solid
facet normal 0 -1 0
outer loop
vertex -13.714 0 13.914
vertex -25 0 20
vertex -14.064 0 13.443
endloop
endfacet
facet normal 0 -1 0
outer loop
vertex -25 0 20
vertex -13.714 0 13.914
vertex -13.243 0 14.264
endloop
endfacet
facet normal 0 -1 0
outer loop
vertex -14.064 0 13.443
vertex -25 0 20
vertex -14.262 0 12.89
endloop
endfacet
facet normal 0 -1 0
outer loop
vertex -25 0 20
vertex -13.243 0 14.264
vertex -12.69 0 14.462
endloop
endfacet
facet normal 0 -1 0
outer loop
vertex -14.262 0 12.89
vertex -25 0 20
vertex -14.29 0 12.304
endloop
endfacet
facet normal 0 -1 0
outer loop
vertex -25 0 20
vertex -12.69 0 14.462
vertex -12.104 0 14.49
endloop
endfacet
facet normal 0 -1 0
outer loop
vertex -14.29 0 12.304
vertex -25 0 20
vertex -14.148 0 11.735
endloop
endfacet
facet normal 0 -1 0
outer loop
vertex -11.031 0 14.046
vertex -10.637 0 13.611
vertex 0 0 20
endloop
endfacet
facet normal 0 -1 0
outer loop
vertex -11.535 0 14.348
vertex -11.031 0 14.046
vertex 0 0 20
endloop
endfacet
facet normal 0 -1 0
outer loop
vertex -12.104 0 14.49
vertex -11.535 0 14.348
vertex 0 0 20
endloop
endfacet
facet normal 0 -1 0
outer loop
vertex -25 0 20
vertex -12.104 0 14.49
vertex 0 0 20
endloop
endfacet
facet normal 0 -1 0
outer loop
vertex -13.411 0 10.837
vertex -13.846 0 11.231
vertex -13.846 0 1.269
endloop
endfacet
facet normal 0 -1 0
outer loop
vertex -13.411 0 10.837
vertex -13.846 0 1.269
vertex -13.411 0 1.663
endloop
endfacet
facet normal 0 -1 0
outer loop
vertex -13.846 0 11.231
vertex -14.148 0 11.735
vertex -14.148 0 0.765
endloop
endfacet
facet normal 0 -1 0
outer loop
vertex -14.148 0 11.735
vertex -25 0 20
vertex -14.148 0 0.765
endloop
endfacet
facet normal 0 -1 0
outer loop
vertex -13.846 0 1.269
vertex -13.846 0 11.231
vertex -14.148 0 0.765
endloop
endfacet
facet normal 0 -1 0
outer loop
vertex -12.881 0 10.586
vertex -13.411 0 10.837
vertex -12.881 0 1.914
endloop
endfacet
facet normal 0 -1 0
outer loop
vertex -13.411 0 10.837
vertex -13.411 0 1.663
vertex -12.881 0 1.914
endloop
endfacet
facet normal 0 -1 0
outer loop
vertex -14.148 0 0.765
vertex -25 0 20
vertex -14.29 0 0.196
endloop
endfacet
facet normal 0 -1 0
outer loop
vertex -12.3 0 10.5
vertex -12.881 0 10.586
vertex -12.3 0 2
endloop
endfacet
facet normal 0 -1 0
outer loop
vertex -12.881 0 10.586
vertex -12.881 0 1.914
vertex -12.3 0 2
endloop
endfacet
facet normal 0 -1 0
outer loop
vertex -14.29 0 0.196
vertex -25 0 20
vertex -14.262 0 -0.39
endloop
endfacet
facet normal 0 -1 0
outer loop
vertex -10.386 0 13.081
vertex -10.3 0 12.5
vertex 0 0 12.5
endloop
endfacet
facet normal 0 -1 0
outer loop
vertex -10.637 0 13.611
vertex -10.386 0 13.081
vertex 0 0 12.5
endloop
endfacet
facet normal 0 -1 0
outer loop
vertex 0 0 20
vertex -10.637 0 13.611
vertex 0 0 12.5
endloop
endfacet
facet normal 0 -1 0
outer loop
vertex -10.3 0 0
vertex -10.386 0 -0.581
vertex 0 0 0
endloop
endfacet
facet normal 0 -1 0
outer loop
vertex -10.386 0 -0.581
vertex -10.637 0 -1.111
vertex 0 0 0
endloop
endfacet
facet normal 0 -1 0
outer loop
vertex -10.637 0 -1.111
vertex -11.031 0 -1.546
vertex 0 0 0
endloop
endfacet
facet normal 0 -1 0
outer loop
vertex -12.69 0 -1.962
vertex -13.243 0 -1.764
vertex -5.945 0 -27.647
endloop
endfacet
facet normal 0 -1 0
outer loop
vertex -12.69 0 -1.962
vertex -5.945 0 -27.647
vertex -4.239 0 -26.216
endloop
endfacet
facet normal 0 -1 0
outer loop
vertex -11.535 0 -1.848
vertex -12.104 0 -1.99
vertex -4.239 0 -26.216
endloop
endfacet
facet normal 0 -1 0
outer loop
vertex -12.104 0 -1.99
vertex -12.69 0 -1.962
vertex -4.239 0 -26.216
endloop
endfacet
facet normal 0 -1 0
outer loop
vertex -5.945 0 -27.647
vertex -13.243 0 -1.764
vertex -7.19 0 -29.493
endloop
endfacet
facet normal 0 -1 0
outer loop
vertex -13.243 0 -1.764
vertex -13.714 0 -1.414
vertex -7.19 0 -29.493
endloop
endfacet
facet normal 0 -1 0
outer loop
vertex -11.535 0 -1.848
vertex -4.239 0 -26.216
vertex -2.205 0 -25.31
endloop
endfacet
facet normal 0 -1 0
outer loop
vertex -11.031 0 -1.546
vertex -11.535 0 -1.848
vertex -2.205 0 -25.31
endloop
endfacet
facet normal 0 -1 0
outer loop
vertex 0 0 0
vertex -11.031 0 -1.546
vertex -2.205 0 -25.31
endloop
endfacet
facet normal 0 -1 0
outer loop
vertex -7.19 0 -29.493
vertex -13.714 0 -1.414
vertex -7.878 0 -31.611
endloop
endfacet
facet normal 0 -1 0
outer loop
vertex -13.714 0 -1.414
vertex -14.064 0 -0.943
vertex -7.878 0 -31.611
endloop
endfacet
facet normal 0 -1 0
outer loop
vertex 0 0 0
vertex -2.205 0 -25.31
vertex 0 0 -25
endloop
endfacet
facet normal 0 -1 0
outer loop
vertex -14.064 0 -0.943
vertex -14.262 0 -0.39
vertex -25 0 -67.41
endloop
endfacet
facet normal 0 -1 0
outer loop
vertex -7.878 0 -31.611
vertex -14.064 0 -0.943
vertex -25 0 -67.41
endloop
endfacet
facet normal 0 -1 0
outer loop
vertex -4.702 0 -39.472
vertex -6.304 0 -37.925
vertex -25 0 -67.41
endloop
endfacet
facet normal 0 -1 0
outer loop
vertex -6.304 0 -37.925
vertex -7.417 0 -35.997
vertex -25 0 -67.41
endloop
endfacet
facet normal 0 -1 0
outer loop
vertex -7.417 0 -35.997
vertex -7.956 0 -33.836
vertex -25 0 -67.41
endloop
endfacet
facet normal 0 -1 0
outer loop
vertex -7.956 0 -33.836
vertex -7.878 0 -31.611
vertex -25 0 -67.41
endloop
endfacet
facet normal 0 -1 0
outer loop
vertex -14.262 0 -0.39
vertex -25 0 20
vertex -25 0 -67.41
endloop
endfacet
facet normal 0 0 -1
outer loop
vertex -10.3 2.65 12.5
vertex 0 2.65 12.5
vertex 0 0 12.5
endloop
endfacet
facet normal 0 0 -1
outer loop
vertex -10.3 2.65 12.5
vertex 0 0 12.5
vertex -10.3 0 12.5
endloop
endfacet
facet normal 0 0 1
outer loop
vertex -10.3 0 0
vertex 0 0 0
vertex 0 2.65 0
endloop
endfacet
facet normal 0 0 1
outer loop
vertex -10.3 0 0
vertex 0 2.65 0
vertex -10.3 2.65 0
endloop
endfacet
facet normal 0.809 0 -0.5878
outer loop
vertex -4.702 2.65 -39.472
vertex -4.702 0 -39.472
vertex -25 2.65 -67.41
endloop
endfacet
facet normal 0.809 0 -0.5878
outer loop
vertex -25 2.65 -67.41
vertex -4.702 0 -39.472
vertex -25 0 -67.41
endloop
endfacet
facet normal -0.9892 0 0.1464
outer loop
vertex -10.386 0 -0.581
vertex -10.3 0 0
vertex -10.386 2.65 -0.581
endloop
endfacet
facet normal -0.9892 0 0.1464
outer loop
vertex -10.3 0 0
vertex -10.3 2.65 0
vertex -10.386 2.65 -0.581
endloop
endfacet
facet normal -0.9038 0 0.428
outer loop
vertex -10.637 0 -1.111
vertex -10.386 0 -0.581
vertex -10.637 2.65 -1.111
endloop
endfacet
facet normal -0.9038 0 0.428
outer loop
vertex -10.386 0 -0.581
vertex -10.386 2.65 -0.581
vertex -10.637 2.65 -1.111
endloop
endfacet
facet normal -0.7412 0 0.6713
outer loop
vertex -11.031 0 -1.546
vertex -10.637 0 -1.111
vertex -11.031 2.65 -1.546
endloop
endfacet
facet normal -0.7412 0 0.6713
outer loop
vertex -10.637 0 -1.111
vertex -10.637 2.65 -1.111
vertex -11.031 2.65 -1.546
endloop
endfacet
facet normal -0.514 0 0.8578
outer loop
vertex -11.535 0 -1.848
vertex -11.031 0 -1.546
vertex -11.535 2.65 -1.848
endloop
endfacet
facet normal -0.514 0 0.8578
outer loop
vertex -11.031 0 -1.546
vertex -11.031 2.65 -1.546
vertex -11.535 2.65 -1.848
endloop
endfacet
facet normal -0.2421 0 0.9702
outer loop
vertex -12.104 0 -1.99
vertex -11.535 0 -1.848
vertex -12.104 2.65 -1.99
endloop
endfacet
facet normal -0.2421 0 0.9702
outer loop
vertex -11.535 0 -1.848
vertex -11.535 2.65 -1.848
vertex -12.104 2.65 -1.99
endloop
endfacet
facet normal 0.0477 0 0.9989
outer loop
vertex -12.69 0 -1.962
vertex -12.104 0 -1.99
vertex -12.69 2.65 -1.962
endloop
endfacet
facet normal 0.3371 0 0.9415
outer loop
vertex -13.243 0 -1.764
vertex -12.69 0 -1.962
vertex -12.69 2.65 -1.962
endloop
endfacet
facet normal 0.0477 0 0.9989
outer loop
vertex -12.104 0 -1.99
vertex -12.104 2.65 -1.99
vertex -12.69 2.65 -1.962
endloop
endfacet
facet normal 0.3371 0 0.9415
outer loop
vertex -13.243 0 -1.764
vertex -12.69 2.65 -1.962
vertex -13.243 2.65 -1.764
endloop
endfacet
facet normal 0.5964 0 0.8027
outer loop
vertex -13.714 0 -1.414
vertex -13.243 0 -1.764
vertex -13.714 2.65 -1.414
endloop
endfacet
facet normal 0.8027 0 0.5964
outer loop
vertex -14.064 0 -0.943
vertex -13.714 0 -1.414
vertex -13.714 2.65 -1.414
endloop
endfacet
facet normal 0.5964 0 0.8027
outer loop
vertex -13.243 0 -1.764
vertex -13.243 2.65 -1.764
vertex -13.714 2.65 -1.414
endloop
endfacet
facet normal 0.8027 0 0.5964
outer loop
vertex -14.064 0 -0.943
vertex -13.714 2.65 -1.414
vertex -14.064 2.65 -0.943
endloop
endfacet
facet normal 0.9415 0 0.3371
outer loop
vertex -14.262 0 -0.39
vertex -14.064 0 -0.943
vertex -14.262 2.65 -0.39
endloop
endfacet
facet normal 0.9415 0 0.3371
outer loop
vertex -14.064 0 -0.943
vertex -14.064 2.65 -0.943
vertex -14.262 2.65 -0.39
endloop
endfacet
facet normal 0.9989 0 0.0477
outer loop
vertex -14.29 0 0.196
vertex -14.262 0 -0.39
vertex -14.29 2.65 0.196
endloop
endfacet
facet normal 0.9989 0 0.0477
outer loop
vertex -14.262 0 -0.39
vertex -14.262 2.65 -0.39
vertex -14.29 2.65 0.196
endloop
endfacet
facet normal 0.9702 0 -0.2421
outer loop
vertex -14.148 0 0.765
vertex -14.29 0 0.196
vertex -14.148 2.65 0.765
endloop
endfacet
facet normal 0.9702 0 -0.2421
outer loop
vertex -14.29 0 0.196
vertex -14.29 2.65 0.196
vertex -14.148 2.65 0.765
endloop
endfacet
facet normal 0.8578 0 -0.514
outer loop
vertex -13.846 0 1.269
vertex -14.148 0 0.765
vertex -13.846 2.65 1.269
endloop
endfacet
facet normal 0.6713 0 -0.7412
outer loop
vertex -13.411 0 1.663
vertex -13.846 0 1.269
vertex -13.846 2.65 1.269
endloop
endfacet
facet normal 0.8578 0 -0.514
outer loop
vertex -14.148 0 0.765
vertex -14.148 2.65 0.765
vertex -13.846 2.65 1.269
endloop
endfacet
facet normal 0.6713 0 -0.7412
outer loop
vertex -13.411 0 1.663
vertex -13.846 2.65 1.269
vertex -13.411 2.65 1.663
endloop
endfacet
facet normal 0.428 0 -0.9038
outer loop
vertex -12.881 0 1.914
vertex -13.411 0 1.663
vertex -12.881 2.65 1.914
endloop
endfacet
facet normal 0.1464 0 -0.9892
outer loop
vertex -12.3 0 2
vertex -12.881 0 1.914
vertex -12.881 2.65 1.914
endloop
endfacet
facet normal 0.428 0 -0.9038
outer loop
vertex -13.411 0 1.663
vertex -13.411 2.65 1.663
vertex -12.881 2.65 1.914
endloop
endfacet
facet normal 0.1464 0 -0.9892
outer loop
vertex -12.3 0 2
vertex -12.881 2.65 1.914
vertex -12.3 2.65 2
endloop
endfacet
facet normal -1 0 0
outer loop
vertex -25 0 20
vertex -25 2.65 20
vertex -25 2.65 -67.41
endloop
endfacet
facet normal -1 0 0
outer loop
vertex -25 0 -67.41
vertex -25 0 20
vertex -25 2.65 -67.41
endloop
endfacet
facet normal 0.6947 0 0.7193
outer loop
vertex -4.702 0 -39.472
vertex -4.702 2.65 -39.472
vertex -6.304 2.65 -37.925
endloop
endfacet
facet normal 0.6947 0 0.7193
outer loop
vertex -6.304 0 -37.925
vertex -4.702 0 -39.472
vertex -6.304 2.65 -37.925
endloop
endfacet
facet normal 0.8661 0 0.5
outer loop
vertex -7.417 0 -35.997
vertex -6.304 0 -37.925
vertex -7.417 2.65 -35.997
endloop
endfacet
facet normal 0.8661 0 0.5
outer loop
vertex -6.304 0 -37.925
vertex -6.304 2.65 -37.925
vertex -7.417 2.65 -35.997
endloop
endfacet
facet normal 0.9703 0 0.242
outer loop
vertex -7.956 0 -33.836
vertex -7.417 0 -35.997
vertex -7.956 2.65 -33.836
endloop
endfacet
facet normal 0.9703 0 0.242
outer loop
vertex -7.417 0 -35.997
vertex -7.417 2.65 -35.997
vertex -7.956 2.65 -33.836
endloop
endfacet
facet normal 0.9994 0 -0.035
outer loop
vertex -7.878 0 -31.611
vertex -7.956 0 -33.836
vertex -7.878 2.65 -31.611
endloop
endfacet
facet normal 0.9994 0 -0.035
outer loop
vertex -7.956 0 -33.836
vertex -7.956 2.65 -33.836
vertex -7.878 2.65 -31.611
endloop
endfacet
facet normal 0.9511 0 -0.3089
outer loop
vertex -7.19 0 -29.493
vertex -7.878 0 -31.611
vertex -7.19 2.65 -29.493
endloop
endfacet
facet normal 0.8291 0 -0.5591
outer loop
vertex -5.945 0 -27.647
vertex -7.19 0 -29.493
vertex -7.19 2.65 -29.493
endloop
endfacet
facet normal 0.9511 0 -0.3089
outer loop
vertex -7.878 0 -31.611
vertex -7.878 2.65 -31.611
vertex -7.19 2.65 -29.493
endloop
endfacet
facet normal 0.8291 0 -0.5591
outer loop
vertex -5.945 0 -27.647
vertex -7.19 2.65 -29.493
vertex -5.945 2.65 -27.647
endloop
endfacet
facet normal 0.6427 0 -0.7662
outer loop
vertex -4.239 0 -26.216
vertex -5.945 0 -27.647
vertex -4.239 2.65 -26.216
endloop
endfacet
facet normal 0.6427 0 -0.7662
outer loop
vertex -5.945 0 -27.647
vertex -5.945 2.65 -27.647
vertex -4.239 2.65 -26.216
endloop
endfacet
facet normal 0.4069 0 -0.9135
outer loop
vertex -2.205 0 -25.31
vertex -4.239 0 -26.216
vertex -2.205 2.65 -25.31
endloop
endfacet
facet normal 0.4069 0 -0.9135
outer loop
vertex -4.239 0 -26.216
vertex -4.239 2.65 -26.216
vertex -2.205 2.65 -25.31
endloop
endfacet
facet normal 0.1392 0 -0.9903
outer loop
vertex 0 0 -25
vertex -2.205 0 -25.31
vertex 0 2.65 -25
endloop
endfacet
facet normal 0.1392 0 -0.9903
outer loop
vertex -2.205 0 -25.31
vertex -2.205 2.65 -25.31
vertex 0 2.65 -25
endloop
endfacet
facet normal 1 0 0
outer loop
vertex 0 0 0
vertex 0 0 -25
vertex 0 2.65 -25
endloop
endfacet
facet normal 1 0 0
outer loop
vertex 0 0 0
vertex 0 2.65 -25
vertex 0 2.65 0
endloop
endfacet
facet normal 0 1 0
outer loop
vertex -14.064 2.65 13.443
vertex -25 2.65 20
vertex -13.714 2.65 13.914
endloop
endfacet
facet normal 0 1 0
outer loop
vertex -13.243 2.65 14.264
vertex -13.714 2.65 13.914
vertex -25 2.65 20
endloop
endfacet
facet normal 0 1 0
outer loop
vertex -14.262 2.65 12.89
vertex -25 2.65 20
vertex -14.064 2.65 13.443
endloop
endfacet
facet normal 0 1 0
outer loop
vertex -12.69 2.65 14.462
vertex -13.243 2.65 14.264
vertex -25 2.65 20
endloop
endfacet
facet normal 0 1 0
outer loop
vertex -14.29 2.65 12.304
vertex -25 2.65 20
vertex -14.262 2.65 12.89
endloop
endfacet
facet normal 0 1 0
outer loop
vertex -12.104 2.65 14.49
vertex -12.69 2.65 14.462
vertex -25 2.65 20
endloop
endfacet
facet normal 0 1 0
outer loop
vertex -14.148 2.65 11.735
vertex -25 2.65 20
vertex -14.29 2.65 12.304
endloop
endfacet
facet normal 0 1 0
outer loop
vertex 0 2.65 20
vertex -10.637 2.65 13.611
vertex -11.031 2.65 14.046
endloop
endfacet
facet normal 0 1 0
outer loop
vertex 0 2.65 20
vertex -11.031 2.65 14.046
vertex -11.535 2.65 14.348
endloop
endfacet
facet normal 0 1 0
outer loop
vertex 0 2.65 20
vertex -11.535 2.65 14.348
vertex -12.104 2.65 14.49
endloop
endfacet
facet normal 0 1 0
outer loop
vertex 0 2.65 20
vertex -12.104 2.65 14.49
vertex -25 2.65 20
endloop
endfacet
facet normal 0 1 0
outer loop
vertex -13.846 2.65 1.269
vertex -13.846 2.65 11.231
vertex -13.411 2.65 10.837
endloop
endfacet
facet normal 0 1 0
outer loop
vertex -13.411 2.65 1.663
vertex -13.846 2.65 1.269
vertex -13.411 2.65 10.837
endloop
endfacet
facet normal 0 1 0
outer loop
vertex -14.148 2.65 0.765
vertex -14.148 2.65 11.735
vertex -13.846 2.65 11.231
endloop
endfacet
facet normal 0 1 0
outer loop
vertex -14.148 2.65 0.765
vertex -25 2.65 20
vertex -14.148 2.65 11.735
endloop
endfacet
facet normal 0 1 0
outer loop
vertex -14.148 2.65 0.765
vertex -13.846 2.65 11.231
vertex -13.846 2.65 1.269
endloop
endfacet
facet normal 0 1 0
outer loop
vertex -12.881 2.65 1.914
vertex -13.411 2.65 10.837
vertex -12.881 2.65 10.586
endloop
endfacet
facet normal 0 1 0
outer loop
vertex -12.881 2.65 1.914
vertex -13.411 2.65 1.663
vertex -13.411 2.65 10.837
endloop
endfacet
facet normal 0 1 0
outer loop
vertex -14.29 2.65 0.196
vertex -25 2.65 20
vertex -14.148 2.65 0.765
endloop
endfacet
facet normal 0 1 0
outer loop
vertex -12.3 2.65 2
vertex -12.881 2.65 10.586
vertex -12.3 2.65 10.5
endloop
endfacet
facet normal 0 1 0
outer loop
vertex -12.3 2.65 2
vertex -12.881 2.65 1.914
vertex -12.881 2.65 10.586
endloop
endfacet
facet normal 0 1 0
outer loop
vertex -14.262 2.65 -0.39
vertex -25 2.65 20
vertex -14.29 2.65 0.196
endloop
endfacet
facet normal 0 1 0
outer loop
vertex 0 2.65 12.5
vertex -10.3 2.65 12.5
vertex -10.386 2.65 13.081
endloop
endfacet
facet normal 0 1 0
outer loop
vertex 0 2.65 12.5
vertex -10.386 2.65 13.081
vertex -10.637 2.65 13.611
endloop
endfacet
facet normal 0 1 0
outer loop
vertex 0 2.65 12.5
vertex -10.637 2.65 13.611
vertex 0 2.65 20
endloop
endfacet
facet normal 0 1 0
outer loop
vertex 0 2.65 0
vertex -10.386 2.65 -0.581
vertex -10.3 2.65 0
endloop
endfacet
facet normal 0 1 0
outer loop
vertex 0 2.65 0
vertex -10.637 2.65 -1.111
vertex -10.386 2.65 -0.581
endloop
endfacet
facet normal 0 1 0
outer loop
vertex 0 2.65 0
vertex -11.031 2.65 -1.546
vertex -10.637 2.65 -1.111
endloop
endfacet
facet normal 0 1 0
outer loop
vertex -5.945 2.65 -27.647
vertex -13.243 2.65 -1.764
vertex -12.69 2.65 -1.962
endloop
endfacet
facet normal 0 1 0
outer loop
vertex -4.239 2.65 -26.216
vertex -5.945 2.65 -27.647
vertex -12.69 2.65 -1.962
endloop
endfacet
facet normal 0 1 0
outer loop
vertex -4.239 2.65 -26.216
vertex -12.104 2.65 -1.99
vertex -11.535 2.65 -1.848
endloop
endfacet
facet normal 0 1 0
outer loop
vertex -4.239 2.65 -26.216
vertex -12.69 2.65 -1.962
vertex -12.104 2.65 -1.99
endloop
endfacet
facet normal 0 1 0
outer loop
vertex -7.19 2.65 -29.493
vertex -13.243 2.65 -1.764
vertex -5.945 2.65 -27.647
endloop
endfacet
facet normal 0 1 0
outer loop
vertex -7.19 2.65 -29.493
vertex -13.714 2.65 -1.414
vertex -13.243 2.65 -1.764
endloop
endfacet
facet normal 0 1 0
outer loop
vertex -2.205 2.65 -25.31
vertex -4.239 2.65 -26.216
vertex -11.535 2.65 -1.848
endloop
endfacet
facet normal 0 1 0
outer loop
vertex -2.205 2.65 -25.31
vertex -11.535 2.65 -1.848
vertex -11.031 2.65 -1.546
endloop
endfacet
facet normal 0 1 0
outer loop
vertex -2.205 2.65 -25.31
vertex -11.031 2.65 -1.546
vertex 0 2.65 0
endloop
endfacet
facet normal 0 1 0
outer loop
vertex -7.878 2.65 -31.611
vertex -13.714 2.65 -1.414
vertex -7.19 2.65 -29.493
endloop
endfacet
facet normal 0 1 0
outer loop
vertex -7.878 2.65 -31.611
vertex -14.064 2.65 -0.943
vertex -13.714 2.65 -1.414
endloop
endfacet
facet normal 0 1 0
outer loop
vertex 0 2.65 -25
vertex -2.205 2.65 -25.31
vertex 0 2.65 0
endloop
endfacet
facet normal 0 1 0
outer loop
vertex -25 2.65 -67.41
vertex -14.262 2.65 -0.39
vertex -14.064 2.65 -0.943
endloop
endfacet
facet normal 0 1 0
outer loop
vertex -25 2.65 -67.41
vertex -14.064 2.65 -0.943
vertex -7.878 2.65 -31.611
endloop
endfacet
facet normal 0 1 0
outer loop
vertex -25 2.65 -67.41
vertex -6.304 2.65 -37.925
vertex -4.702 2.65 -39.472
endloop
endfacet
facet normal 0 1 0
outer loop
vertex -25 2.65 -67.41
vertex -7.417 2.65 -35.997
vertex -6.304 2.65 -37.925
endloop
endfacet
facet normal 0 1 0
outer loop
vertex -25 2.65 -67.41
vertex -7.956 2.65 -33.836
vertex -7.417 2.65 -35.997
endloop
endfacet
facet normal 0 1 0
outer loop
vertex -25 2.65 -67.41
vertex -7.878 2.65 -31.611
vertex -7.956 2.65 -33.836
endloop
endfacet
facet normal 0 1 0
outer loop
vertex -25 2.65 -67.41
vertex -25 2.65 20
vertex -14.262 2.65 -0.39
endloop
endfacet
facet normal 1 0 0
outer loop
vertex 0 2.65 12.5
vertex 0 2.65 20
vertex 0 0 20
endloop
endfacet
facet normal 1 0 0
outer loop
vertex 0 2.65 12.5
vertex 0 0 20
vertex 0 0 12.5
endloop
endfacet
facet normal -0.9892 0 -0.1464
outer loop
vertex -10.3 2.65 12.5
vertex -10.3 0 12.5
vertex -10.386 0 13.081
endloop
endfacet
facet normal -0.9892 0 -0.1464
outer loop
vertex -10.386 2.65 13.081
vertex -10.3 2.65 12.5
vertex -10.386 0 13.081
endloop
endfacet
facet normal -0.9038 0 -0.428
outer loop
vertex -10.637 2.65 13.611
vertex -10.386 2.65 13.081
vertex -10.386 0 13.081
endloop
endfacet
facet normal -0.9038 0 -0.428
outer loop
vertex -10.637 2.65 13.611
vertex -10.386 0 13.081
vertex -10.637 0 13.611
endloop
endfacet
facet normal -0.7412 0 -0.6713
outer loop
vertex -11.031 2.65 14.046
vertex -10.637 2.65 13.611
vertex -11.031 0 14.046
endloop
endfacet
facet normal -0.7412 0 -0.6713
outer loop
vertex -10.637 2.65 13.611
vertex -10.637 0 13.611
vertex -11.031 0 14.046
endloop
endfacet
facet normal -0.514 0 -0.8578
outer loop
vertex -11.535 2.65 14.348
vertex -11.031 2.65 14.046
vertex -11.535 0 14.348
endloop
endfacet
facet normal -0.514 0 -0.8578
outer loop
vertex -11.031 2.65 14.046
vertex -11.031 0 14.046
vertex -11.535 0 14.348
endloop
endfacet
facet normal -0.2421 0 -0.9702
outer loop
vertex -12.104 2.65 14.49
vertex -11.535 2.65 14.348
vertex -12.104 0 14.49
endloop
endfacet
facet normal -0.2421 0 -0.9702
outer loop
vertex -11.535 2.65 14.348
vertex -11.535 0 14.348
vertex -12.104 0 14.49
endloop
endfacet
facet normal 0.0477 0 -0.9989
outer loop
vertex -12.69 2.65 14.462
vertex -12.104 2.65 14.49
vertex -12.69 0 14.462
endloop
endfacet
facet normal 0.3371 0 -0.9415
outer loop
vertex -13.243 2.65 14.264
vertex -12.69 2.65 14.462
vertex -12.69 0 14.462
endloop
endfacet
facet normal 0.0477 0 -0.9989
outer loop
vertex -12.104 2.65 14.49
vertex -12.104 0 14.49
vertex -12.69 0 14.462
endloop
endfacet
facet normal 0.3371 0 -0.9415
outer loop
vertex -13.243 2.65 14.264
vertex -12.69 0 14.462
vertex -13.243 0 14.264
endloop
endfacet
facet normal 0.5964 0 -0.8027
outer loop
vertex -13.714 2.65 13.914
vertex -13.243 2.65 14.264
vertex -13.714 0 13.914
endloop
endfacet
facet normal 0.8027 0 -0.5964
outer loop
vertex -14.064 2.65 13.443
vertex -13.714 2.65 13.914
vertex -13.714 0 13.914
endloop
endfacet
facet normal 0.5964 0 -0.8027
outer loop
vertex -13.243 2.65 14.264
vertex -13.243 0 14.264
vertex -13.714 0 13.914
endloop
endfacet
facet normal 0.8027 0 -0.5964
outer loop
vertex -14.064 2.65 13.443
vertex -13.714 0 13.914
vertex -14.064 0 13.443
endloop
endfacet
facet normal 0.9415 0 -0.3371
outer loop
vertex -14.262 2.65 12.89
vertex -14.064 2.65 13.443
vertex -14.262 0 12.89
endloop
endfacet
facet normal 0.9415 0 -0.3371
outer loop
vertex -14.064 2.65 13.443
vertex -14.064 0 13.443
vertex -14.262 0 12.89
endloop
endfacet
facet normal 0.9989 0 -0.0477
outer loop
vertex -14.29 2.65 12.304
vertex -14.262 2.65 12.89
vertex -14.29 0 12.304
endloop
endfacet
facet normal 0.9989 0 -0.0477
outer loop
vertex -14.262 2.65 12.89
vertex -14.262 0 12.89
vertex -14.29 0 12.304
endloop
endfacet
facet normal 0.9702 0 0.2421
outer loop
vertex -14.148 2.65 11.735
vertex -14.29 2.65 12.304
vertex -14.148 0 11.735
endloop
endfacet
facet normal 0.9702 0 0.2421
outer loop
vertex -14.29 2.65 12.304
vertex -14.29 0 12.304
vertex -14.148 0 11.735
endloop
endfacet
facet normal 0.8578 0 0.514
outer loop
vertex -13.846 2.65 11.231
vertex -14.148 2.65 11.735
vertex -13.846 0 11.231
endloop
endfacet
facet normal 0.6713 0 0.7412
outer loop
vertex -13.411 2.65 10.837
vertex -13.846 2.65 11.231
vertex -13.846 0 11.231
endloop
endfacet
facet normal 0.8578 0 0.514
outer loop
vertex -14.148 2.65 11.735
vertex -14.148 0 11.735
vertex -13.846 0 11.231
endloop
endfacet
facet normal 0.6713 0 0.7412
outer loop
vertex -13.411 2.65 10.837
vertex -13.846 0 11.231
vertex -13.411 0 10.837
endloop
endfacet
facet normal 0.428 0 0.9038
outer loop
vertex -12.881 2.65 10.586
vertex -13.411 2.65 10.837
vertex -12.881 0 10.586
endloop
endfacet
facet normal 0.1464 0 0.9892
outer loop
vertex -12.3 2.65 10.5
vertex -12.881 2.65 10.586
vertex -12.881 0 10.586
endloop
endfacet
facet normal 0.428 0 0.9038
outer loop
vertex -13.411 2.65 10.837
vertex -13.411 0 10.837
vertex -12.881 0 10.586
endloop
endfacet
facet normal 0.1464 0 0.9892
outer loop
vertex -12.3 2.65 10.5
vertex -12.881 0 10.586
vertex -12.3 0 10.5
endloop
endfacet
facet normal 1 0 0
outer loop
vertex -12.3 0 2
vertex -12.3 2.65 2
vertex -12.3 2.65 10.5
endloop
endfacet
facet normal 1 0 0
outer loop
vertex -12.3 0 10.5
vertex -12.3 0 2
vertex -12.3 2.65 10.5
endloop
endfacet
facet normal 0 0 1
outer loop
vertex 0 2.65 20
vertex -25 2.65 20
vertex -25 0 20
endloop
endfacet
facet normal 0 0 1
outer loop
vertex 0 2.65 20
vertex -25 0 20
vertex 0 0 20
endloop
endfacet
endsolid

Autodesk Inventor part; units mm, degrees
ref_plane "YZ Plane" through (0, 0, 0) normal (1, 0, 0) x (0, 1, 0)
ref_plane "XZ Plane" through (0, 0, 0) normal (0, 1, 0) x (-1, 0, 0)
ref_plane "XY Plane" through (0, 0, 0) normal (0, 0, 1) x (1, 0, 0)
sketch "スケッチ1" plane through (0, 0, 0) normal (0, 1, 0) x (-1, 0, 0)
  line L0 (0, 0) -> (25, 0)
  line L1 (25, 0) -> (25, -33)
  line L2 (25, -33) -> (0, -33)
  line L3 (0, -33) -> (0, 0)
  line L4 (0, -33) -> (25, -27)
  line L5 (0, -33) -> (25, -67.4095)
  line L6 (25, -67.4095) -> (25, -33)
  dimension "d0" = 25
  dimension "d1" = 33
  dimension "d2" = 27
  dimension "d3" = 36
extrude "押し出し1" add sketch "スケッチ1" along normal blind 2.65
sketch "スケッチ2" plane through (0, 2.65, 0) normal (0, 1, 0) x (1, 0, 0)
  line L0 (0, 33) -> (-25, 67.4095) projected
  line L1 (0, 0) -> (0, 33) projected
  arc A0 (-4.7023, 39.4721) -> (0, 25) centre (0, 33) ccw
  dimension "d6" = 8
extrude "押し出し2" cut sketch "スケッチ2" against normal blind 2.65
sketch "スケッチ3" plane through (0, 2.65, 0) normal (0, 1, 0) x (1, 0, 0)
  line L0 (-25, 67.4095) -> (-25, 0) projected
  line L1 (-25, 0) -> (-12.3, 0)
  line L2 (-12.3, 0) -> (-12.3, -20)
  line L3 (-12.3, -20) -> (-25, -20)
  line L4 (-25, -20) -> (-25, 0)
  line L5 (0, 0) -> (0, 25) projected
  dimension "d9" = 20
  dimension "d10" = 12.3
extrude "押し出し3" add sketch "スケッチ3" against normal blind 2.65
sketch "スケッチ4" plane through (0, 2.65, 0) normal (0, 1, 0) x (1, 0, 0)
  line L0 (-12.3, 0) -> (0, 0) projected
  circle A0 centre (-12.3, 0) radius 2
  dimension "d13" = 4
extrude "押し出し4" cut sketch "スケッチ4" against normal blind 2.65
sketch "スケッチ5" plane through (0, 2.65, 0) normal (0, 1, 0) x (1, 0, 0)
  line L0 (-12.3, -2) -> (-12.3, -20) projected
  line L1 (-12.3, -20) -> (0, -20)
  line L2 (0, -20) -> (0, -12.5)
  line L3 (0, -12.5) -> (-12.3, -12.5)
  line L4 (-12.3, -12.5) -> (-12.3, -20)
  line L5 (-10.3, 0) -> (0, 0) projected
  dimension "d16" = 12.3
  dimension "d18" = 12.5
extrude "押し出し5" add sketch "スケッチ5" against normal blind 2.65
sketch "スケッチ6" plane through (0, 2.65, 0) normal (0, 1, 0) x (1, 0, 0)
  line L0 (-12.3, -12.5) -> (0, -12.5) projected
  point P0 (0, 0)
hole "穴1" at (-12.3, 2.65, 12.5) direction (0, -1, 0) diameter 4 end through all
properties part number "bendpart_36deg"
